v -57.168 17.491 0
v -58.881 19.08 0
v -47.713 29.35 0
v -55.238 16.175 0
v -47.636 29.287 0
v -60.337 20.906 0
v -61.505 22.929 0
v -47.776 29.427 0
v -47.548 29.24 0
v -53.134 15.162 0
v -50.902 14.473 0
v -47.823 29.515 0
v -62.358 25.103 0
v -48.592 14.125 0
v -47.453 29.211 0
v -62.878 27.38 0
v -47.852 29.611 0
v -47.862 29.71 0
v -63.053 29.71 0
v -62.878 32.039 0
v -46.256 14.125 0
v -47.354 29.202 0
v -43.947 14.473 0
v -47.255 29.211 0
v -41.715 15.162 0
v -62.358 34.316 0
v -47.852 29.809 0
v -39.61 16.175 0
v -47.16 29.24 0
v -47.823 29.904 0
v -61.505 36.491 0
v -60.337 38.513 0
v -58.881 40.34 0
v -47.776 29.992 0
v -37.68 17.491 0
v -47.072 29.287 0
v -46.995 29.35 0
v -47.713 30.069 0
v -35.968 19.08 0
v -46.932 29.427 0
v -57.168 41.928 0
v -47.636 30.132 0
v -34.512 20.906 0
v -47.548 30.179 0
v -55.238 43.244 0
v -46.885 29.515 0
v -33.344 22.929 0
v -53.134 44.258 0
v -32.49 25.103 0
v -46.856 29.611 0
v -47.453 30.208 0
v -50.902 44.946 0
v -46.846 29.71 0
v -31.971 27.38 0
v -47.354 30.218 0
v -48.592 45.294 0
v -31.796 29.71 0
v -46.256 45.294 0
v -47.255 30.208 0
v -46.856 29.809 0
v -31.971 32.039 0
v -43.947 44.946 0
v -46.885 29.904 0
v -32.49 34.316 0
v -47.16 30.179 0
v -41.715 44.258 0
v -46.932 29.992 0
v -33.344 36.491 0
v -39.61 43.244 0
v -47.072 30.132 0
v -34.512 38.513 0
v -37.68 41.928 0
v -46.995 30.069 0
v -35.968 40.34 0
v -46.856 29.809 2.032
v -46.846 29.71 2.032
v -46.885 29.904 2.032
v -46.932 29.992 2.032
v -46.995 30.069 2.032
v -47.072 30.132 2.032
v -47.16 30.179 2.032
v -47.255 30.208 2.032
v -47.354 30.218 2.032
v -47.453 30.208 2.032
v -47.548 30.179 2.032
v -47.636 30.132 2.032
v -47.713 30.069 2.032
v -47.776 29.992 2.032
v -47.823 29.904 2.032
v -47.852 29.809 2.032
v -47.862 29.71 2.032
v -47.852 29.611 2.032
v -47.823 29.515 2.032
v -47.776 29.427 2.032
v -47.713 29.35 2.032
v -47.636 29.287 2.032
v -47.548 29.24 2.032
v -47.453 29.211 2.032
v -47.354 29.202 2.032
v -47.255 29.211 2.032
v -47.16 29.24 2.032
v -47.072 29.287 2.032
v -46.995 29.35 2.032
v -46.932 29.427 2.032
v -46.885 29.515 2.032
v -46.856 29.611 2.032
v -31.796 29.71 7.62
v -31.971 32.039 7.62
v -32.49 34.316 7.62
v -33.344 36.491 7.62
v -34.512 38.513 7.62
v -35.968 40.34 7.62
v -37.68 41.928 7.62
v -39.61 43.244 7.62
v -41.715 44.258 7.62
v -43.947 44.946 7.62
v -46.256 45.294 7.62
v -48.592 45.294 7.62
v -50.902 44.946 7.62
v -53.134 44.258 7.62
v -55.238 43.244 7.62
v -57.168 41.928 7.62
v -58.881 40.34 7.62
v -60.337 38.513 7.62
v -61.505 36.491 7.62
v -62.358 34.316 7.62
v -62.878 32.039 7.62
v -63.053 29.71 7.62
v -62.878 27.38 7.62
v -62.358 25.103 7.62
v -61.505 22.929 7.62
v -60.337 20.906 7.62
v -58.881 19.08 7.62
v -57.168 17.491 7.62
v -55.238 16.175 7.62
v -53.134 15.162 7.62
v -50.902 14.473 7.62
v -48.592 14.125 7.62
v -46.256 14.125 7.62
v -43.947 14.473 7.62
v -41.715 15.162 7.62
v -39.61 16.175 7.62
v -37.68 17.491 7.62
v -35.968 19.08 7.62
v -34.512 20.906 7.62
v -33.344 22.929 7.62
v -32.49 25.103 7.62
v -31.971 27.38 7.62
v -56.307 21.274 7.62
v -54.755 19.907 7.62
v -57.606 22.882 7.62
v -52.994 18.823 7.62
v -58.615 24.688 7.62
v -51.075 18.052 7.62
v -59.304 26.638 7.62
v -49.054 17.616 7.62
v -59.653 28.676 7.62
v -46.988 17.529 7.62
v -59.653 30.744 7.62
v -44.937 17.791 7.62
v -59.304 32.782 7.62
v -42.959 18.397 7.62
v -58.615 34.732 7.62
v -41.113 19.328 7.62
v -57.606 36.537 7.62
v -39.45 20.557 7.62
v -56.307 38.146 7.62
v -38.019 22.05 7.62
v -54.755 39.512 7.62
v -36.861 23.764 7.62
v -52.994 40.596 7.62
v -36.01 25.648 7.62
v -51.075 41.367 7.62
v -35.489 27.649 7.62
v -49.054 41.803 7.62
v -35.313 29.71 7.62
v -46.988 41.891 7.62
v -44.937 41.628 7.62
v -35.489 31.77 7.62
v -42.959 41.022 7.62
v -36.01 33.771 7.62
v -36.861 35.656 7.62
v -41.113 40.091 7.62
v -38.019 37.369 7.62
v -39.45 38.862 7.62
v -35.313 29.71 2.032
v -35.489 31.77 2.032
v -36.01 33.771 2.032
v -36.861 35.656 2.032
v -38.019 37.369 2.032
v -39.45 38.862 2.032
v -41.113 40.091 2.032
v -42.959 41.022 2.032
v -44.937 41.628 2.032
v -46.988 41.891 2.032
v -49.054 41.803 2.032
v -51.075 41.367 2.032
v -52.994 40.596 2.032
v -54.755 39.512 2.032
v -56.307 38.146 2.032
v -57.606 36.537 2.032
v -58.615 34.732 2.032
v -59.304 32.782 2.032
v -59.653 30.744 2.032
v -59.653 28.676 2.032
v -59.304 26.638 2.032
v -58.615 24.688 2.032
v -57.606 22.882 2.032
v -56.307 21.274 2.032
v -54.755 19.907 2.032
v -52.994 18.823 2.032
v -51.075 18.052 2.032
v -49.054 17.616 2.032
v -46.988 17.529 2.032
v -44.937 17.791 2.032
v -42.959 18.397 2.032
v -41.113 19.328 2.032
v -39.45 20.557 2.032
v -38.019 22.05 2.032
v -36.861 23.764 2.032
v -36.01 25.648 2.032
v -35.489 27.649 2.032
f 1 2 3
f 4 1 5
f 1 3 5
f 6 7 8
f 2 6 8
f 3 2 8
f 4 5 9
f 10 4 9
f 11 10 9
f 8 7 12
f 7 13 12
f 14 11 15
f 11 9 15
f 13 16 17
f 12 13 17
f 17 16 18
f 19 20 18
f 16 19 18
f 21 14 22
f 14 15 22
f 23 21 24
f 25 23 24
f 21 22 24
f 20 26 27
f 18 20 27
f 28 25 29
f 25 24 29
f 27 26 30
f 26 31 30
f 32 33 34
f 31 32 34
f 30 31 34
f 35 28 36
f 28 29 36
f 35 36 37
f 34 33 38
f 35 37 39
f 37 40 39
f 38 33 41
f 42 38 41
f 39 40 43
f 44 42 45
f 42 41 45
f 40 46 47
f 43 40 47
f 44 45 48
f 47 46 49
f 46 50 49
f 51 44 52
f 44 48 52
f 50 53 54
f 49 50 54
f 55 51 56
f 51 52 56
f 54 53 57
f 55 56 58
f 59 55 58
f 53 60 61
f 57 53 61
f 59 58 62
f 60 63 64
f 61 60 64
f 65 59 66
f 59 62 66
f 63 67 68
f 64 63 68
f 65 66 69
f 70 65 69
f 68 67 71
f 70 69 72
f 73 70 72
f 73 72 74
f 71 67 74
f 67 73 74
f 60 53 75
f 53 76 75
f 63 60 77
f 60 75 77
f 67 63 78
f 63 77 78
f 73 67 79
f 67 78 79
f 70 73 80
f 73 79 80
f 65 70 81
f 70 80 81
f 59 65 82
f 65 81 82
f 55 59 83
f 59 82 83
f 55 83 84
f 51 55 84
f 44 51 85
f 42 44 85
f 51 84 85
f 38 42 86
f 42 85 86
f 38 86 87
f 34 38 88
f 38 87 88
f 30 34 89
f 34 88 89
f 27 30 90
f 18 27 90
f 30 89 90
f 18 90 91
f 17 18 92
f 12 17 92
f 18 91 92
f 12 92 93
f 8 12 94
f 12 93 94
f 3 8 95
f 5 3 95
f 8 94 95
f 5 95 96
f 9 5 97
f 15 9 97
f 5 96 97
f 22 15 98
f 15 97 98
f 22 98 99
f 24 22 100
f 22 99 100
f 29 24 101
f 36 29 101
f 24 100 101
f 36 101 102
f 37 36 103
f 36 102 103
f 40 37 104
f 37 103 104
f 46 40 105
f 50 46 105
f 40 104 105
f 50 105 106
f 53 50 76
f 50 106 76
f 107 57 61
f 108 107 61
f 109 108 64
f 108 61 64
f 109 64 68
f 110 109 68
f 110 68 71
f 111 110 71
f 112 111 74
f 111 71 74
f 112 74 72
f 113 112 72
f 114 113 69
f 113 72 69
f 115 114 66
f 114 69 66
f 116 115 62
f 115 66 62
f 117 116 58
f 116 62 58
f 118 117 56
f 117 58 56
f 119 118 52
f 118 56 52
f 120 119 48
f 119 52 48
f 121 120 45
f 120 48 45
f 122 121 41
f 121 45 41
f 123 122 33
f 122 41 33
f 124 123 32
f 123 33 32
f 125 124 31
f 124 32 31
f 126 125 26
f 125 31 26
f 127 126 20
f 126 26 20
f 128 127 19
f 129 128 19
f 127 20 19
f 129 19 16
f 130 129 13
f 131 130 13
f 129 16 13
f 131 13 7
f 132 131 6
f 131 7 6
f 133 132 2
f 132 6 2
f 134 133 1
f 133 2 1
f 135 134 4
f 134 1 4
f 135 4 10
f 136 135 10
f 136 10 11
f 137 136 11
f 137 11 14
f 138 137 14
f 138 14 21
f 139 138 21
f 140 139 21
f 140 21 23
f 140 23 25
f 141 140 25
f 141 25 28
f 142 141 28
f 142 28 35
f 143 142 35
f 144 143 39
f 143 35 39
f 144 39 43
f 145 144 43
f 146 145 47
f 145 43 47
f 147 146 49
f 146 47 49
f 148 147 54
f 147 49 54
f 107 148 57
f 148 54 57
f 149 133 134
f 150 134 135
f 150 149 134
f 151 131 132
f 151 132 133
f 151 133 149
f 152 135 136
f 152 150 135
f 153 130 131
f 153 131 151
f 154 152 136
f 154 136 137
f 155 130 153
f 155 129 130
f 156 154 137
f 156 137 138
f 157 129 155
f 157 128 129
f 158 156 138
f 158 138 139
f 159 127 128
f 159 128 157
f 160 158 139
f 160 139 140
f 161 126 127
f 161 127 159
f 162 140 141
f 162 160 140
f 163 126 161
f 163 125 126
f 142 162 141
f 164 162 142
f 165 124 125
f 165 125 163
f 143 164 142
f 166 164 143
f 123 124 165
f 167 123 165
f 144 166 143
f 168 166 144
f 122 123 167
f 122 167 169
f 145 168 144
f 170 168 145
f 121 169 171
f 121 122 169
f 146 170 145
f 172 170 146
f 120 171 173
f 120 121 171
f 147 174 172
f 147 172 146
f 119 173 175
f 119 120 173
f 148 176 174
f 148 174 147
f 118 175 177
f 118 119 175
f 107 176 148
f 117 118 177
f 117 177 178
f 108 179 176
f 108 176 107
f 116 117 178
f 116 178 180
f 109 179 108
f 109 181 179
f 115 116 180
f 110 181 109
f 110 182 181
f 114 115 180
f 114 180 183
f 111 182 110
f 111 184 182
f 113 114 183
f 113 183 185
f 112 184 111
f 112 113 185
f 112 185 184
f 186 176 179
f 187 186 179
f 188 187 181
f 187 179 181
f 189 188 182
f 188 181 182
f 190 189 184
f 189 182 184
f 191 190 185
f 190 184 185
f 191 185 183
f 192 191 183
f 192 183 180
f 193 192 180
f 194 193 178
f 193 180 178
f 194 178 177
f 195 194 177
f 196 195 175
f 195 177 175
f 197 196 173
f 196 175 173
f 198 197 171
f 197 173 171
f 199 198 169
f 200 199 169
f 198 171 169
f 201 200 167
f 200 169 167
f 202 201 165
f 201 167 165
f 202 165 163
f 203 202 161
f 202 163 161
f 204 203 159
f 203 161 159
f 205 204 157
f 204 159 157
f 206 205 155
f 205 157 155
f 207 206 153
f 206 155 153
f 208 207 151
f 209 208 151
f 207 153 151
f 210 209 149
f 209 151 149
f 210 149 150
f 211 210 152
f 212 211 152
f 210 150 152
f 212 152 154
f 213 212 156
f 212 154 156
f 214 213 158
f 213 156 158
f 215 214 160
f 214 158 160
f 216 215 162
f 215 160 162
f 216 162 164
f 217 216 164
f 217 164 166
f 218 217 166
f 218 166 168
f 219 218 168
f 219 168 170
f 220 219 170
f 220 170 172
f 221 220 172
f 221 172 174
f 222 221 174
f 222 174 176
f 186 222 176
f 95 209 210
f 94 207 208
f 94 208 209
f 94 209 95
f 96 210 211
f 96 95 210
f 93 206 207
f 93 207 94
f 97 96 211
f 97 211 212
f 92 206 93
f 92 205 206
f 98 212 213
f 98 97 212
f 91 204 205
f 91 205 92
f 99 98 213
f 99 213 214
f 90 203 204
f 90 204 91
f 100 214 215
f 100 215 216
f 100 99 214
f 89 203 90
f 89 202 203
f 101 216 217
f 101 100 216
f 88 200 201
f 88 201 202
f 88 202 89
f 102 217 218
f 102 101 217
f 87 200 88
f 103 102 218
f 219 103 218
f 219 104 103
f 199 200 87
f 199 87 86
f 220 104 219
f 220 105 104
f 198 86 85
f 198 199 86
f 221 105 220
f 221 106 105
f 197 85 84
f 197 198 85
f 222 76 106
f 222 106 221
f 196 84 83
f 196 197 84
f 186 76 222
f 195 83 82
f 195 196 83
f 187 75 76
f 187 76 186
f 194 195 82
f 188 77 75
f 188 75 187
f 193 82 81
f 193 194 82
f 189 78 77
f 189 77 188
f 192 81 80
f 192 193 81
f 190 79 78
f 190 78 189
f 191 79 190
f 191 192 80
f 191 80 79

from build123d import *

# Parameters (mm, degrees)
F0_R      = 15.628254
F1_DEPTH  = 7.62
F2_R      = 12.192
F3_DEPTH  = 25.4
F3_FACE_R = 12.192
F4_DEPTH  = 23.368
F5_R      = 0.508
F6_DEPTH  = 12.7


with BuildPart() as f1:
    # F0 (on Top) → F1 (new body)
    with BuildSketch(Plane.XY):
        with Locations((-47.424259, 29.709655)):
            Circle(F0_R)
    extrude(amount=F1_DEPTH)

    # F2 (on Top) → F3 (join)
    with BuildSketch(Plane.XY):
        with Locations((-47.505132, 29.709655)):
            Circle(F2_R)
    extrude(amount=F3_DEPTH)

    # F3_face (on face) → F4 (cut, symmetric)
    with BuildSketch(Plane(origin=(-47.505132, 29.709655, 25.4), x_dir=(1, 0, 0), z_dir=(0, 0, 1))):
        Circle(F3_FACE_R)
    extrude(amount=F4_DEPTH, both=True, mode=Mode.SUBTRACT)

    # F5 (on Top) → F6 (cut, symmetric)
    with BuildSketch(Plane.XY):
        with Locations((-47.353999, 29.709655)):
            Circle(F5_R)
    extrude(amount=F6_DEPTH, both=True, mode=Mode.SUBTRACT)


solid = f1.part
